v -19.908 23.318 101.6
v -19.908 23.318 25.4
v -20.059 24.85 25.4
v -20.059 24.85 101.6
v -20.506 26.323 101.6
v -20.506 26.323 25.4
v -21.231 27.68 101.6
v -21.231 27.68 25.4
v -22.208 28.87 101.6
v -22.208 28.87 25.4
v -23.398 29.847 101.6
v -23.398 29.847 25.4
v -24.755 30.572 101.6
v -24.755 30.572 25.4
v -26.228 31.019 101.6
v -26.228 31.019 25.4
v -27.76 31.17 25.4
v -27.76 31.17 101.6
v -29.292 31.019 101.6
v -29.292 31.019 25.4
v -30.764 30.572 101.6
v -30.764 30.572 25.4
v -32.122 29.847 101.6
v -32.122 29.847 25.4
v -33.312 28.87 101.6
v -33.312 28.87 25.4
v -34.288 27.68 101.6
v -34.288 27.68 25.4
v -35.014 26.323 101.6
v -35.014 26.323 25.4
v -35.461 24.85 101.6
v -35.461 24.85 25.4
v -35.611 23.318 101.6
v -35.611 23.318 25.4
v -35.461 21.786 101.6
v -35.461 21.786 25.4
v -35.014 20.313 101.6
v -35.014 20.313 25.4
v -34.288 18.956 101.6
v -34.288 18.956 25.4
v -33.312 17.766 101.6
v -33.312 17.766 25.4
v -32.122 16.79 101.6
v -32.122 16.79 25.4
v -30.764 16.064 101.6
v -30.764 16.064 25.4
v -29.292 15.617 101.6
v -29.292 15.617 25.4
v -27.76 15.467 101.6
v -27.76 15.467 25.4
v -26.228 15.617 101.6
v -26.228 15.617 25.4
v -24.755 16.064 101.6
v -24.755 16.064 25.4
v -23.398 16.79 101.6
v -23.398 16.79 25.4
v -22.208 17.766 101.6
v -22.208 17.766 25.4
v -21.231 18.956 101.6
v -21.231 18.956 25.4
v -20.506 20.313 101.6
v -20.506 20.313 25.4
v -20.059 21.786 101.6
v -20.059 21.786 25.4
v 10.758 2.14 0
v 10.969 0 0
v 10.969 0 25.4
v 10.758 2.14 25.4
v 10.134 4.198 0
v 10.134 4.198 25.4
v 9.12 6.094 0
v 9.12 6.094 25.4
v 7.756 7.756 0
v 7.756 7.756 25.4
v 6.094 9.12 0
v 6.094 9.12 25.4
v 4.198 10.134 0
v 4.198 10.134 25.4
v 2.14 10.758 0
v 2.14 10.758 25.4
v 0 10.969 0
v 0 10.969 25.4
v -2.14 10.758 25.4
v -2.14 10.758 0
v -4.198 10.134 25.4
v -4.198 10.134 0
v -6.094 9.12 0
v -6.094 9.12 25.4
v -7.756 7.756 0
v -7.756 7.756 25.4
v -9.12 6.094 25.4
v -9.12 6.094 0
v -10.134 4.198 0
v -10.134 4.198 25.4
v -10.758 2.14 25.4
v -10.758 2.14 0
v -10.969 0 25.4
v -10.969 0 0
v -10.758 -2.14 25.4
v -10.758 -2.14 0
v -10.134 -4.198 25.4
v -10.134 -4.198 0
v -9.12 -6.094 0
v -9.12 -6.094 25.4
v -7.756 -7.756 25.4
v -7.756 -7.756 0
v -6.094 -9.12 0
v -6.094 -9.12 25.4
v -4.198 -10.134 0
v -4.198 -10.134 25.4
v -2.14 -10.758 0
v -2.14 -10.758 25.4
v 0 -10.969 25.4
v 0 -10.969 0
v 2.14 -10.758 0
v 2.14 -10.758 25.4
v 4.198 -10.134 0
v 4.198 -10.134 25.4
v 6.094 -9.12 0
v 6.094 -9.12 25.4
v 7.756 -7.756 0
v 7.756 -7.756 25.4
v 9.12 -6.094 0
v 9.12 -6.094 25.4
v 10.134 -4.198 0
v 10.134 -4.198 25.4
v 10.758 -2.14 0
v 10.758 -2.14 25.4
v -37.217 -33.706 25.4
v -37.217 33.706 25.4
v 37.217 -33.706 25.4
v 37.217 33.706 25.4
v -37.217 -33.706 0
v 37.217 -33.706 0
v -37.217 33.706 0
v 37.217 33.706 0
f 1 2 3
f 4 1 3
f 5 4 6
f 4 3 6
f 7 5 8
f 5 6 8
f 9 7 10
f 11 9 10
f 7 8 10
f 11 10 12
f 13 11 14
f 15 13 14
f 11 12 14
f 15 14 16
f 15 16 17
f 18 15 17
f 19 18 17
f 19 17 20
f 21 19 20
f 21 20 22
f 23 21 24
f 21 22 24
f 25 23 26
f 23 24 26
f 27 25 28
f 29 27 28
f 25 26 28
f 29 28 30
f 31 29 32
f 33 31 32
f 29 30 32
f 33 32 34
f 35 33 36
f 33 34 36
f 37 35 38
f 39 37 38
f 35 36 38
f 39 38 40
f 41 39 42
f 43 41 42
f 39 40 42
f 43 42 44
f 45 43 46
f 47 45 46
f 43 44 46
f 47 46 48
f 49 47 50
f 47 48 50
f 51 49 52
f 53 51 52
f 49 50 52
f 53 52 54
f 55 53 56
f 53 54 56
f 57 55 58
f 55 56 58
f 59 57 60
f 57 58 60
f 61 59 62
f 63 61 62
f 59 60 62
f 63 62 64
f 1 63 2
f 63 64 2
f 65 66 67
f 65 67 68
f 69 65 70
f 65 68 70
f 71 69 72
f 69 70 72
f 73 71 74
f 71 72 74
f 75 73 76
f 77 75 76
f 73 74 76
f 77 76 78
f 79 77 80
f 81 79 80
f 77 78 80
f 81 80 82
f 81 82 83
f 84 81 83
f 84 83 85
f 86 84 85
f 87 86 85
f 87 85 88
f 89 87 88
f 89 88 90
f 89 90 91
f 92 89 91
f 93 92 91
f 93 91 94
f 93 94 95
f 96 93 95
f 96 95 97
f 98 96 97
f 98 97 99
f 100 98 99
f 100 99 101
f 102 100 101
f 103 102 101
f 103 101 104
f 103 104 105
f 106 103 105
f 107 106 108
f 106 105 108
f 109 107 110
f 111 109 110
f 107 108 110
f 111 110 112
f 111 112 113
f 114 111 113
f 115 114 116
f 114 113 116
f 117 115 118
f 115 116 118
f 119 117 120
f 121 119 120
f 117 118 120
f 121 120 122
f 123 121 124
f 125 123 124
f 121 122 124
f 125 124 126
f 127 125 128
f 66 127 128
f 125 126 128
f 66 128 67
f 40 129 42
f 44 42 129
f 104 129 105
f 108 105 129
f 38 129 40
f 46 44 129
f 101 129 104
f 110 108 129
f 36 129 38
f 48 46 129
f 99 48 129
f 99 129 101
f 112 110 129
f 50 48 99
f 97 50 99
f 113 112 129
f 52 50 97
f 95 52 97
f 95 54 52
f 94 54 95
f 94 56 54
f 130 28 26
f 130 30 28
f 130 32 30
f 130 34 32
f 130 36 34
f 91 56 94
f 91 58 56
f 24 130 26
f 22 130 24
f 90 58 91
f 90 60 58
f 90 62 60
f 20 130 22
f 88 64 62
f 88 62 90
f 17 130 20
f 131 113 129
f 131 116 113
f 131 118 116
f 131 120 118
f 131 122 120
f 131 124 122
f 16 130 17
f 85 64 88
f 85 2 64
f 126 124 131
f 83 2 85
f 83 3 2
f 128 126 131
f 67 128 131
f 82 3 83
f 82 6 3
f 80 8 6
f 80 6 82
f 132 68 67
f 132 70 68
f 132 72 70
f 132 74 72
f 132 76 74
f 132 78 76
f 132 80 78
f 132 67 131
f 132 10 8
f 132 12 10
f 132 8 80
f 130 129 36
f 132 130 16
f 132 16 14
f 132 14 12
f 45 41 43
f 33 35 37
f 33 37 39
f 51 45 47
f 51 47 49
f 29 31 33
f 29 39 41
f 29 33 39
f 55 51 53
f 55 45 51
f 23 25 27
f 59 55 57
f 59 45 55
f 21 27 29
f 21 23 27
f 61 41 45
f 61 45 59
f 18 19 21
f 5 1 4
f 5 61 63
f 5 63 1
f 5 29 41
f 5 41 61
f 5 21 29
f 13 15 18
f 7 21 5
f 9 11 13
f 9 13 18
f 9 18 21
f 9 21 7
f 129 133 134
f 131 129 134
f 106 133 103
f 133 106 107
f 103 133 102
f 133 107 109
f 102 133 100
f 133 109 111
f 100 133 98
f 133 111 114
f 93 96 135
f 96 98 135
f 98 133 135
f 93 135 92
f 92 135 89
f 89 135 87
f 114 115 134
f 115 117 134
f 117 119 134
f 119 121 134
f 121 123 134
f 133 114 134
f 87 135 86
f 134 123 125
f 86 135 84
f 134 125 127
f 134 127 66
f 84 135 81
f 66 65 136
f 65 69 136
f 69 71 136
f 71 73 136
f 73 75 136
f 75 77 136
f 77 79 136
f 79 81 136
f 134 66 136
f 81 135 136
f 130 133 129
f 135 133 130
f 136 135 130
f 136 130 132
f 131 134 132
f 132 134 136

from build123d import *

# Parameters (mm, degrees)
F0_W     = 74.433348
F0_H     = 67.411334
F1_DEPTH = 25.4
F2_R     = 10.968737
F3_DEPTH = 25.401
F4_R     = 7.851637
F5_DEPTH = 76.2


with BuildPart() as f1:
    # F0 (on Top) → F1 (new body)
    with BuildSketch(Plane.XY):
        with Locations((1e-06, 4e-06)):
            Rectangle(F0_W, F0_H)
    extrude(amount=F1_DEPTH)

    # F2 (on face) → F3 (cut, through all)
    with BuildSketch(Plane.XY.offset(25.4)):
        Circle(F2_R)
    extrude(amount=-F3_DEPTH, mode=Mode.SUBTRACT)

    # F4 (on face) → F5 (join)
    with BuildSketch(Plane.XY.offset(25.4)):
        with Locations((-27.759731, 23.318172)):
            Circle(F4_R)
    extrude(amount=F5_DEPTH)


solid = f1.part
